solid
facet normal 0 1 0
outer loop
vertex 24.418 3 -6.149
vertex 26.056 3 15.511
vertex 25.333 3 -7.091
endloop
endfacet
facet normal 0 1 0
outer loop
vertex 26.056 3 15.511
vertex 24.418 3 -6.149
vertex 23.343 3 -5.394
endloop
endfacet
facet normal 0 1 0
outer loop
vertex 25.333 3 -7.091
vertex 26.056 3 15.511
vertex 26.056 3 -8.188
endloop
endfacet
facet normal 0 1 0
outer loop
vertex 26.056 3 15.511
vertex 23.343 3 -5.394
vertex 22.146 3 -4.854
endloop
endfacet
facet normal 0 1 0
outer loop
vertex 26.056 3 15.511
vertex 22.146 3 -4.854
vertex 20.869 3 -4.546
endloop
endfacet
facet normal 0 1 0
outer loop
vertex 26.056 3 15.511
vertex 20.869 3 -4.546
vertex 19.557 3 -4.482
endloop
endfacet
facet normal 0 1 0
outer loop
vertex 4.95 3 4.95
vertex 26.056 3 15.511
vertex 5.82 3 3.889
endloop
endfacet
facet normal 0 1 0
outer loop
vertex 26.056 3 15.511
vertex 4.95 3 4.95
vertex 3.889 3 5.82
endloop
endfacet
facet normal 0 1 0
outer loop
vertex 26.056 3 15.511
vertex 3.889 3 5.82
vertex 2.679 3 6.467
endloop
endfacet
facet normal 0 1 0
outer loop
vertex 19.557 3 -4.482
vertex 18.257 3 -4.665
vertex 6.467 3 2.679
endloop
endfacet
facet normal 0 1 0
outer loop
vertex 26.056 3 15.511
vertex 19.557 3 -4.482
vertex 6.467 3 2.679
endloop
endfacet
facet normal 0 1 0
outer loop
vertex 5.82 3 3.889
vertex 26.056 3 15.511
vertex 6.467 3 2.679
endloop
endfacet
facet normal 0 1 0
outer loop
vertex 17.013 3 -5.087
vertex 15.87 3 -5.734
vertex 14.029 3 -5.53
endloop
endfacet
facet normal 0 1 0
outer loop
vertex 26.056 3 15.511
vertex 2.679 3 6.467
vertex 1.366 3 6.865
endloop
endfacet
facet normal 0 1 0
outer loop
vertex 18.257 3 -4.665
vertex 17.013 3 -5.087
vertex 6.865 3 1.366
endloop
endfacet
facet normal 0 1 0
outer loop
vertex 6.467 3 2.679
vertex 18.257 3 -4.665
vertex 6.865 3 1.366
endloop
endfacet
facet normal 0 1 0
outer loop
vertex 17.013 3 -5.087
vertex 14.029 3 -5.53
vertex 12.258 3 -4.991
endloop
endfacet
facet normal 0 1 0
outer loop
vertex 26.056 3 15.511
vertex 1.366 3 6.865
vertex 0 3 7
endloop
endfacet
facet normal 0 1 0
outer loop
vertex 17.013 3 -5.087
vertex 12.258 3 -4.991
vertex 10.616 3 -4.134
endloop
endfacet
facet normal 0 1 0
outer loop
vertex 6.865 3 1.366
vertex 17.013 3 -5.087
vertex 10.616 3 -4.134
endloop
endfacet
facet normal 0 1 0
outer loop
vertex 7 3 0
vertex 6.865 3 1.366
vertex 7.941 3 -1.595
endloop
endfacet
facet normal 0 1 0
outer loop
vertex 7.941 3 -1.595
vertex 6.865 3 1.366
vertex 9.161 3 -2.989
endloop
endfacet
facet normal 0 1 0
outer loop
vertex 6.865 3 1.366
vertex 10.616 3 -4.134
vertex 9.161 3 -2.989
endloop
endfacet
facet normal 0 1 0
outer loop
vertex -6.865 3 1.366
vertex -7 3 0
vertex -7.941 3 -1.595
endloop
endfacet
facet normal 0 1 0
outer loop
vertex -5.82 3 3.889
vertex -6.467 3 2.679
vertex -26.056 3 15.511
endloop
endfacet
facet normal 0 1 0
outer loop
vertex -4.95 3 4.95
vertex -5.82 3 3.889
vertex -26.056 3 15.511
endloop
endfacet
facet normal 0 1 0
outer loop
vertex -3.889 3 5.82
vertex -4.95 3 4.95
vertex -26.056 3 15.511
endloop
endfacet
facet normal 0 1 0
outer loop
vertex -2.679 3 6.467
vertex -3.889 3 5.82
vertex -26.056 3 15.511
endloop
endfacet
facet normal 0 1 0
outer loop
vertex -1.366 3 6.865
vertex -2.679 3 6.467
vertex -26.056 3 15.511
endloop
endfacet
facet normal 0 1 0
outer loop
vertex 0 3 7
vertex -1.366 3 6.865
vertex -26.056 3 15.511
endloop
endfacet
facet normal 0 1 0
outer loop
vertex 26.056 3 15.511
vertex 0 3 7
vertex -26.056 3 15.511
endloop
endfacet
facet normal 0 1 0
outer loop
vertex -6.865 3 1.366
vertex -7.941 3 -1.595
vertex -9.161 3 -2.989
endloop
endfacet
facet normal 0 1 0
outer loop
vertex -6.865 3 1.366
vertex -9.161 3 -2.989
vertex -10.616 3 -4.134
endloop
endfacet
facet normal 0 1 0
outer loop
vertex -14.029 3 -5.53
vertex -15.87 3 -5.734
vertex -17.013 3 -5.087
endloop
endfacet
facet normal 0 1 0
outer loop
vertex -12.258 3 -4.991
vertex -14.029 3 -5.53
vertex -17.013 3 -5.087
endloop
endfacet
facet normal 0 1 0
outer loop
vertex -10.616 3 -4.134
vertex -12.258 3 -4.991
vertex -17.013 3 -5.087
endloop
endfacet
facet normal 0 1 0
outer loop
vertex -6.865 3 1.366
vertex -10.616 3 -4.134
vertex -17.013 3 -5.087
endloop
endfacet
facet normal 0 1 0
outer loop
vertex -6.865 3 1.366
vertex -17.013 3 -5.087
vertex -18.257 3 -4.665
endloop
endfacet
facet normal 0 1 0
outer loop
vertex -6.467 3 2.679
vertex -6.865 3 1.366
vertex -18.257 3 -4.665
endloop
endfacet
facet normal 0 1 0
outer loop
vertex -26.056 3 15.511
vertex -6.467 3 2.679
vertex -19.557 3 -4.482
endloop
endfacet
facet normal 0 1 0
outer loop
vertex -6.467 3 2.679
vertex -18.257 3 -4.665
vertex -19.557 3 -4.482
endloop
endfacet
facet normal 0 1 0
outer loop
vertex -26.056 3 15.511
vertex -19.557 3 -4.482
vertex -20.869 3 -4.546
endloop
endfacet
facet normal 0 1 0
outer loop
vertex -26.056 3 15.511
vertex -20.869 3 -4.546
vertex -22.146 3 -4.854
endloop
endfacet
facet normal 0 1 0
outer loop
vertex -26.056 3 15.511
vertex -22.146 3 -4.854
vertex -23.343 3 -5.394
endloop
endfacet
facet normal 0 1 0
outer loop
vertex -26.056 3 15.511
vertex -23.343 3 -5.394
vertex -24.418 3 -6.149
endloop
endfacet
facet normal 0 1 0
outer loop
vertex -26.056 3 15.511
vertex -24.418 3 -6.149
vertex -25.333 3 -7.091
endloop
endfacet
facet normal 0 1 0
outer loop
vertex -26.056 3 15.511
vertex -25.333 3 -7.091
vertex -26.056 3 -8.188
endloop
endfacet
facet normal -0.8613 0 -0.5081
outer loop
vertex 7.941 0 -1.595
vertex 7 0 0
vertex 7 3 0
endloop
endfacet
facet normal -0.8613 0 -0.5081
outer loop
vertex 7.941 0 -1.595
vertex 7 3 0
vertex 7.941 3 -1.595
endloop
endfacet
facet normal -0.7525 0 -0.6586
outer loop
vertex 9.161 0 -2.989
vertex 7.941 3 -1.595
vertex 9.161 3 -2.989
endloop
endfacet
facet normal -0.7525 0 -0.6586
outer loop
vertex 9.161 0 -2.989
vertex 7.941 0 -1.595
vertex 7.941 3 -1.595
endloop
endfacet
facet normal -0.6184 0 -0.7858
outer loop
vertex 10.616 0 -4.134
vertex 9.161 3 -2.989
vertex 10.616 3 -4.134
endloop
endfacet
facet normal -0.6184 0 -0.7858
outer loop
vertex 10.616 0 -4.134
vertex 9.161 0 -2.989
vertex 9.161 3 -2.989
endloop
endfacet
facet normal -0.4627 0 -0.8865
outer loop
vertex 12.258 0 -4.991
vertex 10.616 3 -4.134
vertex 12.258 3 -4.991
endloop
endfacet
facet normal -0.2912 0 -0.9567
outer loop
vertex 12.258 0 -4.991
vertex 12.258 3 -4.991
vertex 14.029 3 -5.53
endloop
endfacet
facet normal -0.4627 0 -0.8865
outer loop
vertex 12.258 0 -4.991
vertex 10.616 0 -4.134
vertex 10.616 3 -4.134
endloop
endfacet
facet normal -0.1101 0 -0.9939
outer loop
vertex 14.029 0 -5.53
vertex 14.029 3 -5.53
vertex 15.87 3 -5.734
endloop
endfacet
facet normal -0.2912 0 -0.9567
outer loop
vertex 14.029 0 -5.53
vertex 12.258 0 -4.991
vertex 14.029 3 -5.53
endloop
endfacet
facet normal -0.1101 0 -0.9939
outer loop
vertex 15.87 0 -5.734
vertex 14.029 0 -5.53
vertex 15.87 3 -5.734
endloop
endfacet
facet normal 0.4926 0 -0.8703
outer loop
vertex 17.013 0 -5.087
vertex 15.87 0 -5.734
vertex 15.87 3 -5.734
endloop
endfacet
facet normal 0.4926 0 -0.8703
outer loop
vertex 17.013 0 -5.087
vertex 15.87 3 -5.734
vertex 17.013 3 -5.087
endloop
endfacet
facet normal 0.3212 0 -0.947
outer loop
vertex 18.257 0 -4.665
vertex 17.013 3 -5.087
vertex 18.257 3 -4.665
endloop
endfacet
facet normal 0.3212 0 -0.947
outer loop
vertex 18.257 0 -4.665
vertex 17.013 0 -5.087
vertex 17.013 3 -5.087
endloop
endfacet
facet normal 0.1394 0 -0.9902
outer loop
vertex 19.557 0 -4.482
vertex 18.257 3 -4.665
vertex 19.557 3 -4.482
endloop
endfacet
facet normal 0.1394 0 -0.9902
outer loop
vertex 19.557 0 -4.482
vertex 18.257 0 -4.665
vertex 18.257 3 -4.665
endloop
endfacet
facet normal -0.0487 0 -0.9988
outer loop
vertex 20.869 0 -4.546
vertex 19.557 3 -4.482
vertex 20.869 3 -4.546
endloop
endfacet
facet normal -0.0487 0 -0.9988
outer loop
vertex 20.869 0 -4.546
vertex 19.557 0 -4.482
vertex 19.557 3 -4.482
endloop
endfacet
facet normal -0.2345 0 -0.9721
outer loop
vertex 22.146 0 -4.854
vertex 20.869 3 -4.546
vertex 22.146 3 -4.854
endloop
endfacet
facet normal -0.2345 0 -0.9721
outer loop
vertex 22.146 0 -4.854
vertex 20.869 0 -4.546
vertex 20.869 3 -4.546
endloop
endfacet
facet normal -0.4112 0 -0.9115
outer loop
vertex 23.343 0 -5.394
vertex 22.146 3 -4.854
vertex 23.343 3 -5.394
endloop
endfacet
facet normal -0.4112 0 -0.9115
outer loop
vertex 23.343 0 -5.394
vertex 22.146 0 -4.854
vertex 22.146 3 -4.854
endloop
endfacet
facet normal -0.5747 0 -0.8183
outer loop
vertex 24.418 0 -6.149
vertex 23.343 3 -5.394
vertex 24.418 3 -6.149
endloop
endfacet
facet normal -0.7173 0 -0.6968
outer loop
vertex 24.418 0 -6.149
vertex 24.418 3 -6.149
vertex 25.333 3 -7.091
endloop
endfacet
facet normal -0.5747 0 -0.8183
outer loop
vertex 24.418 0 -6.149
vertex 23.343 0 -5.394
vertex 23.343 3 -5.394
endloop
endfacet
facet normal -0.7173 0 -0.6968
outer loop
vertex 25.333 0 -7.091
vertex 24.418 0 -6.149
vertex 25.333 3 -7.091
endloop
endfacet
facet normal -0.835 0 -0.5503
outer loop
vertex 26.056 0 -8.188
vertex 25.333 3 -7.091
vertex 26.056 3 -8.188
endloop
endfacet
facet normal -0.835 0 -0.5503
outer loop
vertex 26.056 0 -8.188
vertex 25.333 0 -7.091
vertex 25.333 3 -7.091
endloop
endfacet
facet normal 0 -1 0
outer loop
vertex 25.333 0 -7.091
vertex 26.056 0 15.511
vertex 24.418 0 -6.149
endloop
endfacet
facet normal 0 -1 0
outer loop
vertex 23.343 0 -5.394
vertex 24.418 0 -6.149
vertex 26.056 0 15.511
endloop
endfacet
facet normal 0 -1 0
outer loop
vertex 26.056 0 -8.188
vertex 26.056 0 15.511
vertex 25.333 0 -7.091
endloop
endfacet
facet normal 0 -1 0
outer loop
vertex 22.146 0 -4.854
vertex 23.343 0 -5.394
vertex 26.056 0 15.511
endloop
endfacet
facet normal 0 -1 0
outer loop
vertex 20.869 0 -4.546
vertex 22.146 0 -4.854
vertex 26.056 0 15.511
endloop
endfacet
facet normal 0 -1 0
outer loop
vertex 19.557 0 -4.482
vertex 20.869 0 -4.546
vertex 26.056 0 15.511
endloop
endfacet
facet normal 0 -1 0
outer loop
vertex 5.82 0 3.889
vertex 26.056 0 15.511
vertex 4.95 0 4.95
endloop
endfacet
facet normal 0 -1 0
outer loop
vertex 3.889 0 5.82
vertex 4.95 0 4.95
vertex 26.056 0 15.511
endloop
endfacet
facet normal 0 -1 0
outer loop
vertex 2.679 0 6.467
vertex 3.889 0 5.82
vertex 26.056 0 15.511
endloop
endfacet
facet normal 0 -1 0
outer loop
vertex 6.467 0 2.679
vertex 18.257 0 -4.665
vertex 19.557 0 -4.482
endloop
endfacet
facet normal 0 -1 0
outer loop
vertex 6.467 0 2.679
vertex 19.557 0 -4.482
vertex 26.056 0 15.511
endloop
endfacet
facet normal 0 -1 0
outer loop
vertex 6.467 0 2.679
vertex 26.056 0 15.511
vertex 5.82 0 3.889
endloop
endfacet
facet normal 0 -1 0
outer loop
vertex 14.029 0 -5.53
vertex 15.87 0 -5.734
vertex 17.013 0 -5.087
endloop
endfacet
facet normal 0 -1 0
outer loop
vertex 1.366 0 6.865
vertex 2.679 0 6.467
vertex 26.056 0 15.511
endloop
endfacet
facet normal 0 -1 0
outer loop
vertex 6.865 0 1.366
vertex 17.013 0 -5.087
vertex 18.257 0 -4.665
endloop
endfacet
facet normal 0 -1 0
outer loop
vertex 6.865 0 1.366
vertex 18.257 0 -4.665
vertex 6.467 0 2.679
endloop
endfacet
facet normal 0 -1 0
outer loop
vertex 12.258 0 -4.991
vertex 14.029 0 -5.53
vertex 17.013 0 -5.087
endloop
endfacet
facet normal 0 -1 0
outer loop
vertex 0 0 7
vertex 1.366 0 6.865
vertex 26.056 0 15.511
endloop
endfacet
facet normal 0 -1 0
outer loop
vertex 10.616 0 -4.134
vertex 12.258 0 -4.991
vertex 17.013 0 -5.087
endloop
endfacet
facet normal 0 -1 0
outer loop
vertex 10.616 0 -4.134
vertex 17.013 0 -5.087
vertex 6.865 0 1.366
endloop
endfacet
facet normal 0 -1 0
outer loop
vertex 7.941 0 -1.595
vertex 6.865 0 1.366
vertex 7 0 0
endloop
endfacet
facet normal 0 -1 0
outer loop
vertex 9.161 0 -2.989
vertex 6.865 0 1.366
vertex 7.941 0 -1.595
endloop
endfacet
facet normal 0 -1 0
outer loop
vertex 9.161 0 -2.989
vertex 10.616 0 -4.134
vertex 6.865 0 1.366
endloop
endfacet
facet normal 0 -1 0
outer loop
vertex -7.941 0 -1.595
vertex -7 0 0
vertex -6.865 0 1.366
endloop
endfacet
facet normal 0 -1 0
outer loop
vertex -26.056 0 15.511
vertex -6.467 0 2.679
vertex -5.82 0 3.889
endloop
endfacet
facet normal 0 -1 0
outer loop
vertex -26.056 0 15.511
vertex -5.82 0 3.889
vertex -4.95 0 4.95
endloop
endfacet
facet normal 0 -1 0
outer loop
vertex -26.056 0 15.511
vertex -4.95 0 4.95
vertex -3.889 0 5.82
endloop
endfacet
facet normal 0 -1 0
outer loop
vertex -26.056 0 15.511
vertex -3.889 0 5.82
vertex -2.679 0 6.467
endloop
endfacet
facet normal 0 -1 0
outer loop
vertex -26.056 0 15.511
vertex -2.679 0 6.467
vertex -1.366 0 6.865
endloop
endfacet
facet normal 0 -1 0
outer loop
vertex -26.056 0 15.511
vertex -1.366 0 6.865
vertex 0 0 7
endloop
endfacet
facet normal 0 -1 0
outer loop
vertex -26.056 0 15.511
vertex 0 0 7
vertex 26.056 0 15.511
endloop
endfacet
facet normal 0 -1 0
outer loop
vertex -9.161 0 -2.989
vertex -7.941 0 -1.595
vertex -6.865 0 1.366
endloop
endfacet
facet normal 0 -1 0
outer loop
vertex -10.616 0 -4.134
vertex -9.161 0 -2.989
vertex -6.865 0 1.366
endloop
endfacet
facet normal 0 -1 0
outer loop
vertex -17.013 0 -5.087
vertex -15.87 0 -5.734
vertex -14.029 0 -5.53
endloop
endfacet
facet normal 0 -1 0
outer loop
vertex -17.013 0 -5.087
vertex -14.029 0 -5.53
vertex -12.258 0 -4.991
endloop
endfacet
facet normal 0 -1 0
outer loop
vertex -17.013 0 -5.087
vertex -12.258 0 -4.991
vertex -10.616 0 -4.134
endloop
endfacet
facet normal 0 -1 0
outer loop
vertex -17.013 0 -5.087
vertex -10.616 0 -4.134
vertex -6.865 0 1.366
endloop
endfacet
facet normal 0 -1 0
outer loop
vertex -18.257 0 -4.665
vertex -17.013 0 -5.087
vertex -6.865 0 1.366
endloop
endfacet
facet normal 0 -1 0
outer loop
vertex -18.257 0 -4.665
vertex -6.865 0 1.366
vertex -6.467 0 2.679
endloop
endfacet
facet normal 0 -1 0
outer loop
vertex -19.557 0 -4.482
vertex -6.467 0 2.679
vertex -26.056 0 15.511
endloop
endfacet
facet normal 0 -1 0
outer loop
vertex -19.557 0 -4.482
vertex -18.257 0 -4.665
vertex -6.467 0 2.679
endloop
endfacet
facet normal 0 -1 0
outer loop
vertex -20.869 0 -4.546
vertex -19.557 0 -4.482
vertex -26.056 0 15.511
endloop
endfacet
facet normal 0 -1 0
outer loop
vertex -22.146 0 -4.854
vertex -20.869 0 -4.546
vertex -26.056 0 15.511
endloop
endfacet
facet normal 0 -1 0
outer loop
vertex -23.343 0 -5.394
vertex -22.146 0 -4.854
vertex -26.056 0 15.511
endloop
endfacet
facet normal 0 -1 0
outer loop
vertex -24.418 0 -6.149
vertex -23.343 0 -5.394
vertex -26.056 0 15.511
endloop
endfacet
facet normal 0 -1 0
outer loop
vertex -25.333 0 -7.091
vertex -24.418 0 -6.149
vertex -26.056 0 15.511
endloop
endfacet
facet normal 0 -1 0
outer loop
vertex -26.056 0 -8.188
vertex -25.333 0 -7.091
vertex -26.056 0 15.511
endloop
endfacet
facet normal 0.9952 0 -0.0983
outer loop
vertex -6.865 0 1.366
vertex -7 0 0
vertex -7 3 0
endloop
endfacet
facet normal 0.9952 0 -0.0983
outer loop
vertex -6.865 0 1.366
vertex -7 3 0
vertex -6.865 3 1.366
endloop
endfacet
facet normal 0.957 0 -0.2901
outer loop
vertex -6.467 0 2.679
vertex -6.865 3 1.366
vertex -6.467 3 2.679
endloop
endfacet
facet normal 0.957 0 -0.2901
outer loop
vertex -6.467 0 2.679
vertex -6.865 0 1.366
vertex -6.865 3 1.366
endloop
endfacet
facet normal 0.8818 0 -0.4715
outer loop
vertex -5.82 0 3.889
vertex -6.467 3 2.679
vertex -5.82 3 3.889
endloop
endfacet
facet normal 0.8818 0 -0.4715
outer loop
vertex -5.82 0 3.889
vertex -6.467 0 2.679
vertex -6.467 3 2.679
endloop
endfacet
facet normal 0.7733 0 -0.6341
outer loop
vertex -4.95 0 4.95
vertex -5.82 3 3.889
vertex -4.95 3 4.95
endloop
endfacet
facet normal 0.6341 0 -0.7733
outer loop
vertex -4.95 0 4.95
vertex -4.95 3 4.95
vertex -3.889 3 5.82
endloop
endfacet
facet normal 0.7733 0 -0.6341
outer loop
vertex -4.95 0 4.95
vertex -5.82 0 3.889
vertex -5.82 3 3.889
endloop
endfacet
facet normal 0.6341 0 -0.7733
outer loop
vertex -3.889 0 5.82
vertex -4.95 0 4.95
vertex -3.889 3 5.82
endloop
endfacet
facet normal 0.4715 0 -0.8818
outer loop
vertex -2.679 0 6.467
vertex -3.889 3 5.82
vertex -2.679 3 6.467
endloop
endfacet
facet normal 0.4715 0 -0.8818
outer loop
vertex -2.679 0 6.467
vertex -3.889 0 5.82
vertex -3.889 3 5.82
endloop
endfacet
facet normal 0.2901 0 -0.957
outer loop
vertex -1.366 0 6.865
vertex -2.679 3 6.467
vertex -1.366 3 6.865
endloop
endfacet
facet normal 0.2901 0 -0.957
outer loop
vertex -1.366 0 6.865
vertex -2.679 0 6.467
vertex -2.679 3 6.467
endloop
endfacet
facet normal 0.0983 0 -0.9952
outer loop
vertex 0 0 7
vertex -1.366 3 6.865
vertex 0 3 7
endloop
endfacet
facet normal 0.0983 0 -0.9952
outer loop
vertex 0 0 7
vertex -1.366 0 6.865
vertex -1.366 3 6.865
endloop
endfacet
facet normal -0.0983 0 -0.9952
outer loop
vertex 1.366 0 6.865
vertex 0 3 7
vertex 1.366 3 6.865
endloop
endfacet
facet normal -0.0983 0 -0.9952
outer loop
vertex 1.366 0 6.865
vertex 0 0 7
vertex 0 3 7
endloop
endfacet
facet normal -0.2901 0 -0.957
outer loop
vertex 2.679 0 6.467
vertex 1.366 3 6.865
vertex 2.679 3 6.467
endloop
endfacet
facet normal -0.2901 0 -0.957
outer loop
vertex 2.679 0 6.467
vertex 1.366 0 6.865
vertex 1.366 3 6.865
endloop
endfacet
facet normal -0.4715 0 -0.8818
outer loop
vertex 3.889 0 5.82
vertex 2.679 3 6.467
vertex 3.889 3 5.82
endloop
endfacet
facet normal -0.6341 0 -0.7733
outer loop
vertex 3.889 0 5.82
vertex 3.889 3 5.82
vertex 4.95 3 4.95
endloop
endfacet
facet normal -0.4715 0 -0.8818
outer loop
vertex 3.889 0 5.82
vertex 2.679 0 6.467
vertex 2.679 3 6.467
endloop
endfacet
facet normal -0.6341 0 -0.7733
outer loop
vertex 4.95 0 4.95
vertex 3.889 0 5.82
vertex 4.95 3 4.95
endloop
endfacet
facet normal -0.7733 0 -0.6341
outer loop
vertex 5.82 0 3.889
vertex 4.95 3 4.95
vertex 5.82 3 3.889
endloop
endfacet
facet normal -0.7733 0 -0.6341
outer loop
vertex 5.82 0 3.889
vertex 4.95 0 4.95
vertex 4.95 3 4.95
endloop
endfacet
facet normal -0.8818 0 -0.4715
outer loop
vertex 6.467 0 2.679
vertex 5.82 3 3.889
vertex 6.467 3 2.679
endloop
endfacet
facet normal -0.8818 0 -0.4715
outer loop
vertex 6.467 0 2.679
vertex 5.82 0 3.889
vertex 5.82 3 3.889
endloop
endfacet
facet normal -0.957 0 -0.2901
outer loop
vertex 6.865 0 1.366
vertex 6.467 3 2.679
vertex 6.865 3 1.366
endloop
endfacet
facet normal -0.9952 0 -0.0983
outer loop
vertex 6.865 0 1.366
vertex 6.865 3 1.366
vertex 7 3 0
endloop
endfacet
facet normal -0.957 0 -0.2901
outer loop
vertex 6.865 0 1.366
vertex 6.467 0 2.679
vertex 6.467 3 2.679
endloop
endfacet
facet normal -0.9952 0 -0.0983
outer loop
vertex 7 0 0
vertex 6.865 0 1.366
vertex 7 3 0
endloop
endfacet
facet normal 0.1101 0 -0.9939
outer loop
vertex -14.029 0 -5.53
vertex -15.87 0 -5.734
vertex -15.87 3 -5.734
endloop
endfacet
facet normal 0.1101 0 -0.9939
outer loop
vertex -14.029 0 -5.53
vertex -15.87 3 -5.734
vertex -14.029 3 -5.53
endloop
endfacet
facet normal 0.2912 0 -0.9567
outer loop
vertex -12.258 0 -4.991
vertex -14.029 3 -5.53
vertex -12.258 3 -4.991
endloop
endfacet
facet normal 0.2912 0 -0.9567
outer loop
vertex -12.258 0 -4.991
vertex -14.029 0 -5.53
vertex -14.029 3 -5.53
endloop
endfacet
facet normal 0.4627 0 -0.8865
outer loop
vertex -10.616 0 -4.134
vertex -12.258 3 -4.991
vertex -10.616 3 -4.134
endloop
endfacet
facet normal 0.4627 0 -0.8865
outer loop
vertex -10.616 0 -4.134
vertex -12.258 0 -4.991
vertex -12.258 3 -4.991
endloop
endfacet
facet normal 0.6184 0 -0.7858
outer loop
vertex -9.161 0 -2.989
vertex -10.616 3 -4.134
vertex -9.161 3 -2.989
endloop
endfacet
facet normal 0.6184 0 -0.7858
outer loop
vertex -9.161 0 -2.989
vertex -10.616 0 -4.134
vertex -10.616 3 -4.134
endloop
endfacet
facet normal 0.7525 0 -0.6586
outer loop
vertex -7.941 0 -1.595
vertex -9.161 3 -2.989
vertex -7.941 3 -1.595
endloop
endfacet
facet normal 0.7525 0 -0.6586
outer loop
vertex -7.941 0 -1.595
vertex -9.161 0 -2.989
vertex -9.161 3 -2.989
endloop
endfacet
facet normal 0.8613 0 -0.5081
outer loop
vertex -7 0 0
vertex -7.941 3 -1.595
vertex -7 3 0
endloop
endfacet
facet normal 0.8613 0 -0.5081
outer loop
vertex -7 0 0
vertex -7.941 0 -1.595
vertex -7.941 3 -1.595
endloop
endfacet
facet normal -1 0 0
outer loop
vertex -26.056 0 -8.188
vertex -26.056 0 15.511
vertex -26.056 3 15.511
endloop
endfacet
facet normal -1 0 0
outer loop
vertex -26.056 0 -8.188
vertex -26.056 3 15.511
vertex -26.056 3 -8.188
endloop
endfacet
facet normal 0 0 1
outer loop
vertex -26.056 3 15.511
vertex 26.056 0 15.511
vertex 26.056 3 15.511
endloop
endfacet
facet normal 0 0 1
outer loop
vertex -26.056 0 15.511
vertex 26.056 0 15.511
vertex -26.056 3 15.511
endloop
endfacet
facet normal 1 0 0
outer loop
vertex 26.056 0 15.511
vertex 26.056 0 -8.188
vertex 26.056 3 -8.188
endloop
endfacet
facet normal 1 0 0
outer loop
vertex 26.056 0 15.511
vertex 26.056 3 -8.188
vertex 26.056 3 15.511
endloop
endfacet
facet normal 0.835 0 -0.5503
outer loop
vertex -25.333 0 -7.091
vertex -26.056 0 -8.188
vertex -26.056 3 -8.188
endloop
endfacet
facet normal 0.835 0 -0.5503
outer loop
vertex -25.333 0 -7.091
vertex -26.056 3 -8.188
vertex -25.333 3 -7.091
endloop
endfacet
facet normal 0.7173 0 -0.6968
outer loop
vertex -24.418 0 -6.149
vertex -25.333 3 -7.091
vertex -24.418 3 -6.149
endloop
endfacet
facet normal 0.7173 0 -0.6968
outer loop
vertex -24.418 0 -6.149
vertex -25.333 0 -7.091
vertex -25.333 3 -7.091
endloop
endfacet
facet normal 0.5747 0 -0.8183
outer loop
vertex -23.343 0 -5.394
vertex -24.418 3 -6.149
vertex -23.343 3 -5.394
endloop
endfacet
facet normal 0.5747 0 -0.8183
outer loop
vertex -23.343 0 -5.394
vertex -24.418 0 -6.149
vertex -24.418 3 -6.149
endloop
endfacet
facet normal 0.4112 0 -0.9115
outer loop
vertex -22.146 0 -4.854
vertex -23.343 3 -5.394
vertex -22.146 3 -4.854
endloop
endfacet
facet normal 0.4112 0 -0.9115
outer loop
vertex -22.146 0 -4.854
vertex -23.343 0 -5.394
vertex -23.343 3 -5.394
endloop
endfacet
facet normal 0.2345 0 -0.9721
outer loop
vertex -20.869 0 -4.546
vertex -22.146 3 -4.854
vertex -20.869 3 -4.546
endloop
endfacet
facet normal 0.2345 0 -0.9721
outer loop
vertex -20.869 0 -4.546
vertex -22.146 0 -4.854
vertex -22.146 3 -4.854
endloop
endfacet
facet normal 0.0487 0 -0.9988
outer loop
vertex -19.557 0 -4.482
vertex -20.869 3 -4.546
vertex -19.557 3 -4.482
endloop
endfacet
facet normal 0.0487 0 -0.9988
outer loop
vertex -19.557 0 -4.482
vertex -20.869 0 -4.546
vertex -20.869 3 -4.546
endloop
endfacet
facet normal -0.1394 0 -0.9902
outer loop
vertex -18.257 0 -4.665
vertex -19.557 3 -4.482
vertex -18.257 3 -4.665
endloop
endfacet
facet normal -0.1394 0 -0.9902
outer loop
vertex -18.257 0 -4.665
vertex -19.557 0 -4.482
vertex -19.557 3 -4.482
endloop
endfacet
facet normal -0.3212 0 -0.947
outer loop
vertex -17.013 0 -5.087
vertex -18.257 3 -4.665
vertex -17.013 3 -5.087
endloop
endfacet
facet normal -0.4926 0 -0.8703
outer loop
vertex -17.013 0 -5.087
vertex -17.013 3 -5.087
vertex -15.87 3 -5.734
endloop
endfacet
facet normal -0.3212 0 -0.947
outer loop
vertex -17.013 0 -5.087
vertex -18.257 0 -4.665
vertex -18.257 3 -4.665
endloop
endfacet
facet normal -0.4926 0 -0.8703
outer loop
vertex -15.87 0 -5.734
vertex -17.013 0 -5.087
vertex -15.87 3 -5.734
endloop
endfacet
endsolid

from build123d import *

# Parameters (mm, degrees)
BOSS_EXTRUDE1_DEPTH = 3


with BuildPart() as part:
    # Sketch2 → Boss-Extrude1 (new body)
    with BuildSketch(Plane(origin=(0, 0, 0), x_dir=(1, 0, 0), z_dir=(0, 1, 0))):
        with BuildLine():
            Line((26.055569119, 8.188046441), (26.055569119, -15.511162218))
            Line((26.055569119, -15.511162218), (-26.055569119, -15.511162218))
            Line((-26.055569119, -15.511162218), (-26.055569119, 8.188046441))
            ThreePointArc((-26.055569119, 8.188046441), (-21.514872246, 4.669726518), (-15.870079226, 5.73406431))
            ThreePointArc((-15.870079226, 5.73406431), (-10.616247764, 4.133629141), (-7, 0))
            ThreePointArc((-7, 0), (0, -7), (7, 0))
            ThreePointArc((7, 0), (10.616247764, 4.133629141), (15.870079226, 5.73406431))
            ThreePointArc((15.870079226, 5.73406431), (21.514872246, 4.669726518), (26.055569119, 8.188046441))
        make_face()
    extrude(amount=BOSS_EXTRUDE1_DEPTH)


solid = part.part
